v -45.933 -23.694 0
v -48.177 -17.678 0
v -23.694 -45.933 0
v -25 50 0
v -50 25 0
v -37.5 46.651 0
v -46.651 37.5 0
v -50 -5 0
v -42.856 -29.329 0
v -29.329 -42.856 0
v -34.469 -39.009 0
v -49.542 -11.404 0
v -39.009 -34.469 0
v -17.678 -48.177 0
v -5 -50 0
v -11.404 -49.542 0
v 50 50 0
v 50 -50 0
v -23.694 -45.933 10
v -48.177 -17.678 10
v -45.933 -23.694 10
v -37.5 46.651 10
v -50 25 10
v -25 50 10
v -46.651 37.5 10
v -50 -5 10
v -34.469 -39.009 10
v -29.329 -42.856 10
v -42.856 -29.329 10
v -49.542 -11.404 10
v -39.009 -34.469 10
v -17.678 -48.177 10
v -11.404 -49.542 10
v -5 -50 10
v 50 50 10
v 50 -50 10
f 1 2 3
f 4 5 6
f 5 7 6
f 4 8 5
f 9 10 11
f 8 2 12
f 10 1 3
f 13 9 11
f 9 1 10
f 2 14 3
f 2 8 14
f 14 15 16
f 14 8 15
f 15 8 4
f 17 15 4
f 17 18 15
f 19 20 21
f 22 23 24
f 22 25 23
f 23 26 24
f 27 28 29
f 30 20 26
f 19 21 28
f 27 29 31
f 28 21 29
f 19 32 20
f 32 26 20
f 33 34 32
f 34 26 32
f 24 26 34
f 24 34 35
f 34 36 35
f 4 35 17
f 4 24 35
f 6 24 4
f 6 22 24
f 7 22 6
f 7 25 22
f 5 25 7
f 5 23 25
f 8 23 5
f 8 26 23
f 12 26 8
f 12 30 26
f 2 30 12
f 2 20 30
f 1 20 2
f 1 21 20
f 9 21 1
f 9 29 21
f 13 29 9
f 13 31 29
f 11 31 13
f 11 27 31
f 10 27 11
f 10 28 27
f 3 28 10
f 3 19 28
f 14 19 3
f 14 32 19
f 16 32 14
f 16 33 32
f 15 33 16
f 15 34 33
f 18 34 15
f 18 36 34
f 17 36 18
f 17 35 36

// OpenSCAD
// file: ../lib/TOGArrayLib1.scad
// TOGArrayLib1.4
// 
// Functions for working with arrays.
// 
// v1.1:
// - tal1_reduce assert(is_list(items)) to prevent infinite recursion
//   when given undefined or other non-list values
// v1.1.1:
// - Fix tal1_uniq_remap_v2 to return "list-remap-result" as the
//   first element of the returned list
// v1.2:
// - Add tal1_replace_at function
// v1.3:
// - tal1_is_vec_of, tal1_is_vec_of_num
// v1.4:
// - tal1_assert_for_each, for when you want to assert something
//   about each of a list of items and get nice failure messages

/**
 * Make a list with the contents of list `a`,
 * but starting at offset `off`, replaced by the contents of list `b`.
 * len(result) = max(len(a), off+len(b))
 */
function tal1_replace_at(a, off, b, default_value=undef, default_value_function=undef) =
	assert(is_list(a))
	assert(is_list(b))
	let( _dvf = !is_undef(default_value_function) ? default_value_function : function(i) default_value )
[
	for( i=[0:1:min(off,len(a))-1] ) a[i],
	for( i=[len(a):1:off-1] ) _dvf(i),
	for( i=[off:1:off+len(b)-1] ) b[i-off],
	for( i=[off+len(b):1:len(a)-1] ) a[i],
];

// Simplest case
assert([] == tal1_replace_at([], 0, []));
// Second simplest cases
assert(["foo"] == tal1_replace_at(["foo"], 0, []));
assert(["foo"] == tal1_replace_at([], 0, ["foo"]));
// Replace one item
assert(["foo","quux","baz"] == tal1_replace_at(["foo","bar","baz"], 1, ["quux"]));
// Replace and extend
assert(["foo","quux","tuna","tina"] == tal1_replace_at(["foo","bar","baz"], 1, ["quux", "tuna", "tina"]));
// Add beyond end of `a`
assert(["foo","zzz","quux"] == tal1_replace_at(["foo"], 2, ["quux"], default_value="zzz"));
// Adding 'nothing' should still fill to that point with defaults
assert(["foo","zzz","zzz"] == tal1_replace_at(["foo"], 3, [], default_value="zzz"));


function tal1_reduce(start, items, func, offset=0) =
	assert(is_list(items))
	len(items) == offset ? start :
	tal1_reduce(func(start, items[offset]), items, func, offset+1);

function tal1_consecutive_duplicate_count(items) = tal1_reduce(
	[0, undef],
	items,
	function(z,item) [z[0] + (item == z[1] ? 1 : 0), item]
)[0];

assert(0 == tal1_consecutive_duplicate_count([]));
assert(0 == tal1_consecutive_duplicate_count([50]));
assert(1 == tal1_consecutive_duplicate_count([50,50]));
assert(0 == tal1_consecutive_duplicate_count([50,51,52,53]));
assert(1 == tal1_consecutive_duplicate_count([50,51,52,52]));
assert(3 == tal1_consecutive_duplicate_count([50,50,50,50]));

// Set test_size to arbirarily large values
// to ensure that OpenSCAD can handle heavy recursion
let(test_size=1000) assert(test_size/2 == tal1_consecutive_duplicate_count([for(i=[0:1:test_size-1]) floor(i/2)]));



function tal1_uniq_(items, off0, off1) =
	let(chunklen = off1-off0)
	chunklen == 0 ? [] :
	chunklen == 1 ? [items[off0]] :
	let(half=floor(chunklen/2))
	let(left  = tal1_uniq_(items, off0     , off0+half))
	let(right = tal1_uniq_(items, off0+half, off1     ))
	assert(len(left) > 0)
	assert(len(right) > 0)
	left[len(left)-1] == right[0] ? [each left, for(i=[1:1:len(right)-1]) right[i]] :
	[each left, each right];

/** Given a list of items, returns a new list with identical consecutive items merged */
function tal1_uniq(items) = tal1_uniq_(items, 0, len(items));

assert([] == tal1_uniq([]));
assert([123] == tal1_uniq([123]));
assert([55,0,1,2,3] == tal1_uniq([55,0,1,2,3]));
assert([55,0,1,2] == tal1_uniq([55,0,1,1,2]));
assert([55,0,1] == tal1_uniq([55,55,0,0,0,0,0,0,1,1,1,1]));
assert([55,0] == tal1_uniq([55,0,0,0,0,0,0,0]));



/**
 * Returns [new items, old index -> new index mapping].
 * No-op version.
 */
function tal1_uniq_remap_v1(items) =
	["list-remap-result", items, [for (vi=[0:1:len(items)-1]) vi]];

// [a, a, b, b, c, c]
//
// [a,    ...], []  -> [a],[0]
// [a, a, ...], [0] -> [a],[0,0]

assert([1,2,3] == [1,2,3]);

/**
 * Recursive version that will combine adjacent identical vertexes,
 * but will use the original items.
 */
function tal1_uniq_remap_v2(items, map=[]) =
	let(index = len(map))
	len(items) == index ? ["list-remap-result", items, map] :
	index == 0 ? tal1_uniq_remap_v2(items, [0]) :
	items[index] == items[map[index-1]] ? tal1_uniq_remap_v2(items, [for(vi=map) vi, map[index-1]]) :
	tal1_uniq_remap_v2(items, [for(vi=map) vi, index]);

assert(tal1_uniq_remap_v2([1,1,2,2,3,4]) == ["list-remap-result", [1,1,2,2,3,4], [0,0,2,2,4,5]]);


/**
 * Returns true if `vec` is a list of at least min_len items
 * and component_check(each item, even those beyond min_len) is true.
 */
function tal1_is_vec_of(vec, min_len=0, component_check=function(x) true) =
	assert(is_num(min_len) && min_len >= 0)
	assert(is_function(component_check))
	is_list(vec) && len(vec) >= min_len &&
	tal1_reduce(true, vec, function(prev,item) prev && component_check(item));

function tal1_is_vec_of_num(vec, min_len=0) = tal1_is_vec_of(vec, min_len, function(i) is_num(i));

assert( true == tal1_is_vec_of_num([1,2,3]));
assert( true == tal1_is_vec_of_num([]));
assert( true == tal1_is_vec_of_num([1,2,3], 3));
assert(false == tal1_is_vec_of_num([1,2], 3));
assert(false == tal1_is_vec_of_num([1,2,"spoon"], 3));
// Requirements are ambiguous when
// first min_len items are numbers, but there are non-numeric items afterwards,
// so let's error on the side of saying 'no, it's not a list of numbers';
// i.e. the item check and the min_len are independent.
assert(false == tal1_is_vec_of_num([1,2,3,"artichoke"], 3));


/**
 * Asserts that item_checker(each item in list, index of item)[0] is true.
 * Second element of item_checker return value is assertion message.
 * Returns the original list, in case that's useful to you.
 */
function tal1_assert_for_each(list, item_checker) =
	let( _ignored = [ for(i=[0:1:len(list)-1])
		let(q=item_checker(list[i],i))
		let(passed=is_bool(q) ? q : is_list(q) ? q[0] : assert(false, str(
			"tal1_assert_for_each: item_checker should return Bool|[Bool,String], but returned ",
			q, " for item at index ", i)))
		let(message=is_list(q) ? q[1] : undef)
		assert(passed, message)
		q
	])
	list;

// Callback can return a boolean...
assert([1,2,3] == tal1_assert_for_each([1,2,3], function(v,i) is_num(v)));
// ...or a [boolean, string]
assert([1,2,3] == tal1_assert_for_each([1,2,3], function(v,i) [is_num(v), "element be a num"]));
// file: ../lib/TOGComplexLib1.scad
function tcplx1_multiply(a, b) =
	[a[0]*b[0] - a[1]*b[1], a[0]*b[1] + a[1]*b[0]];
function tcplx1_divide(a, b) =
	let(bot = (b[0]*b[0] + b[1]*b[1]))
	[
		(a[0]*b[0] + a[1]*b[1])/bot,
		(a[1]*b[0] - a[0]*b[1])/bot
	];

assert([-11,23] == tcplx1_multiply([3,2], [1,7]));

assert([-1,3] == tcplx1_multiply([3,1], [0,1]));
assert([-1,3] == tcplx1_multiply([0,1], [3,1]));

echo(tcplx1_divide([-1,3], [3,1]));
assert([0,1] == tcplx1_divide([-1,3], [3,1]));

function tcplx1_normalize(vec) =
	let(veclen = sqrt(vec[0]*vec[0]+vec[1]*vec[1]))
	[vec[0] / veclen, vec[1] / veclen];

function tcplx1_relative_turnvec_vv(v0, v1) =
	tcplx1_divide(tcplx1_normalize(v1), tcplx1_normalize(v0));

function tcplx1_relative_turnvec_abc(p0, p1, p2) = tcplx1_relative_turnvec_vv(p1-p0, p2-p1);

// A 90-degree turn
assert([0,1] == tcplx1_relative_turnvec_abc([0,0], [1,0], [1,1]));
assert([0,1] == tcplx1_relative_turnvec_abc([0,0], [0,1], [-1,1]));

// A 45-degree turn
assert(tcplx1_normalize([1,1]) == tcplx1_relative_turnvec_abc([0,0], [1,0], [ 2,1]));
assert(tcplx1_normalize([1,1]) == tcplx1_relative_turnvec_abc([0,0], [0,1], [-1,2]));


function tcplx1_relative_angle_abc(p0, p1, p2) =
	let(turnvec = tcplx1_relative_turnvec_abc(p0, p1, p2))
	atan2(turnvec[1], turnvec[0]);

assert(-135 == tcplx1_relative_angle_abc([0,0], [1,0], [0,-1]));
assert( -90 == tcplx1_relative_angle_abc([0,0], [1,0], [1,-1]));
assert(   0 == tcplx1_relative_angle_abc([0,0], [1,0], [2, 0]));
assert(  90 == tcplx1_relative_angle_abc([0,0], [1,0], [1, 1]));
assert( 135 == tcplx1_relative_angle_abc([0,0], [1,0], [0, 1]));

assert(  90 == tcplx1_relative_angle_abc([1,1], [3,3], [1, 5]));
// file: ../lib/TOGMod1Constructors.scad
// TOGMod1Constructors-v1.6
// 
// Functions to construct objects understood by TOGMod1
// 
// v1.1:
// - Add togmod1_make_rounded_rect
// v1.2:
// - togmod1_make_rounded_rect can make ovals
// v1.3:
// - togmod1_circle_points, to just get the points of a circle
// - if pos parameter to circle function has a third element,
//   returned vertexes will include it as the z component;
// v1.3.1
// - Some assertions
// v1.4:
// - Refactor togmod1_rounded_rect_points and togmod1_circle_points
//   to use togmod1__make_nd_vector_adder for adapting to whatever
//   `pos` parameter is.
// v1.5:
// - togmod_rounded_rect_points will not simplify completely rounded sides
//   (where length of side is exactly twice the rounding radius)
//   unless simplify_rounded_sides=true
//   - This makes it more useful for polyhedron generation,
//     where radius varies, but number of points must remain constant.
// v1.6:
// - togmod1_make_rect makes a simple rectangle
// - togmod1_make_rounded_rect will defer to togmod1_make_rect when r=0

use <./TOGArrayLib1.scad>

function togmod1__make_nd_vector_adder(origin=[0,0]) =
	let(origin_is_zero = tal1_reduce(true, origin, function(prev,item) prev && item == 0))
	origin_is_zero ? (function(vec) len(vec) >= len(origin) ? vec : tal1_replace_at(origin, 0, vec)) :
	function(vec) [
		for(i=[0:1:max(len(origin),len(vec))-1]) (len(vec) > i ? vec[i] : 0) + (len(origin) > i ? origin[i] : 0),
	];

assert([1,2,3] == togmod1__make_nd_vector_adder()([1,2,3]));
echo(togmod1__make_nd_vector_adder([0,0,3])([1,2]));
assert([1,2,3] == togmod1__make_nd_vector_adder([0,0,3])([1,2]));


function togmod1_make_cuboid(size) =
	assert(is_list(size))
	assert(len(size) >= 3)
	assert(is_num(size[0]))
	assert(is_num(size[1]))
	assert(is_num(size[2]))
	["polyhedron-vf", [
		[-size[0]/2, -size[1]/2, -size[2]/2],
		[+size[0]/2, -size[1]/2, -size[2]/2],
		[-size[0]/2, +size[1]/2, -size[2]/2],
		[+size[0]/2, +size[1]/2, -size[2]/2],
		[-size[0]/2, -size[1]/2, +size[2]/2],
		[+size[0]/2, -size[1]/2, +size[2]/2],
		[-size[0]/2, +size[1]/2, +size[2]/2],
		[+size[0]/2, +size[1]/2, +size[2]/2]
	], [
		[0,1,3,2],[0,4,5,1],[4,6,7,5],[3,7,6,2],[1,5,7,3],[6,4,0,2]
	]];

function togmod1_make_polygon(verts) =
	["polygon-vp", verts, [[for( i=[0:1:len(verts)-1] ) i%len(verts)]]];

function togmod1_rounded_rect_points(size, r, pos=[0,0], simplify_rounded_sides=false) =
	assert(is_list(size))
	assert(len(size) >= 2)
	let(radii = is_list(r) ? r : is_num(r) ? [r,r] : assert(false, "rounded_rect r(adius) should be list<num> or num"))
	let(rx = radii[0])
	let(ry = radii[1])
	assert(is_num(rx))
	assert(is_num(ry))
	assert(size[0] >= 2*rx, str("size[0] must be >= 2*r[0]; size[0] = ",size[0],", 2*r[0] = ",2*rx))
	assert(size[1] >= 2*ry, str("size[1] must be >= 2*r[1]; size[1] = ",size[1],", 2*r[1] = ",2*ry))
	let(quarterfn=max($fn/4, 1))
	let(qfnx = simplify_rounded_sides && size[0] == 2*rx ? quarterfn-1 : quarterfn)
	let(qfny = simplify_rounded_sides && size[1] == 2*ry ? quarterfn-1 : quarterfn)
	let(finalizepos = togmod1__make_nd_vector_adder(pos))
[
	for(a=[0 : 1 : qfnx]) let(ang=      a*90/quarterfn) finalizepos([ size[0]/2-rx + rx*cos(ang),  size[1]/2-ry + ry*sin(ang)]),
	for(a=[0 : 1 : qfny]) let(ang= 90 + a*90/quarterfn) finalizepos([-size[0]/2+rx + rx*cos(ang),  size[1]/2-ry + ry*sin(ang)]),
	for(a=[0 : 1 : qfnx]) let(ang=180 + a*90/quarterfn) finalizepos([-size[0]/2+rx + rx*cos(ang), -size[1]/2+ry + ry*sin(ang)]),
	for(a=[0 : 1 : qfny]) let(ang=270 + a*90/quarterfn) finalizepos([ size[0]/2-rx + rx*cos(ang), -size[1]/2+ry + ry*sin(ang)]),
];

function togmod1_make_rect(size) =
	togmod1_make_polygon([
		[-size[0]/2, -size[1]/2],
		[+size[0]/2, -size[1]/2],
		[+size[0]/2, +size[1]/2],
		[-size[0]/2, +size[1]/2],
	]);

function togmod1_make_rounded_rect(size, r) =
	r == 0 ? togmod1_make_rect(size) :
	togmod1_make_polygon(togmod1_rounded_rect_points(size,r,simplify_rounded_sides=true));

function togmod1_circle_points(r, pos=[0,0], d=undef) =
	assert( !is_undef(r) || !is_undef(d) )
	assert(!is_undef(pos[0]))
	assert(!is_undef(pos[1]))
	let(finalizepos = togmod1__make_nd_vector_adder(pos))
	let(r_ = !is_undef(r) ? r : d/2)
	let(fn = max($fn, 6))
	[for(i=[0 : 1 : fn-1]) finalizepos([r_*cos(i*360/fn), r_*sin(i*360/fn)])];

function togmod1_make_circle(r, pos=[0,0], d=undef) =
	togmod1_make_polygon(togmod1_circle_points(r=r, pos=pos, d=d));

function togmod1_make_cylinder(d, zrange=[0,1], r=undef, pos=[0,0]) =
	assert( !is_undef(r) || !is_undef(d) )
	let( r_ = !is_undef(r) ? r : d/2 )
	// TODO: Make polyhedron directly
	["linear-extrude-zs", zrange, togmod1_make_circle(r=r_, pos=pos)];

function togmod1__is_range1d(range) = is_list(range) && len(range) == 2 && is_num(range[0]) && is_num(range[1]);

function togmod1_linear_extrude_z(range, shape) =
	assert(togmod1__is_range1d(range))
	["linear-extrude-zs", range, shape];
function togmod1_linear_extrude_x(range, shape) =
	assert(togmod1__is_range1d(range))
	["rotate", [90, 0, 90], togmod1_linear_extrude_z(range, shape)];
function togmod1_linear_extrude_y(range, shape) =
	assert(togmod1__is_range1d(range))
	["rotate", [90, 0, 180], togmod1_linear_extrude_z(range, shape)];
// file: ../lib/TOGMod1.scad
// TOGMod1
// OpenSCAD library for representing shapes
// 
// See also: Functional OpenSCAD (https://github.com/thehans/FunctionalOpenSCAD)

module togmod1_domodule(mod) {
	assert(is_list(mod));
	assert(len(mod) > 0);
	if( mod[0] == "polygon-vp" ) {
		// ["polygon-vp", vertexes, paths]
		polygon(points=mod[1], paths=mod[2]);
	} else if( mod[0] == "polyhedron-vf" ) {
		polyhedron(mod[1], faces=mod[2]);
	} else if( mod[0] == "scale" ) {
		assert(len(mod) == 3);
		scale(mod[1]) togmod1_domodule(mod[2]);
	} else if( mod[0] == "translate" ) {
		assert(len(mod) == 3);
		assert(is_list(mod[1]));
		for(c=mod[1]) assert(is_num(c), "translate component should be numeric");
		translate(mod[1]) togmod1_domodule(mod[2]);
	} else if( mod[0] == "rotate" ) {
		assert(len(mod) == 3);
		rotate(mod[1]) togmod1_domodule(mod[2]);
	} else if( mod[0] == "intersection" ) {
		intersection_for( i=[1:1:len(mod)-1] ) togmod1_domodule(mod[i]);
	} else if( mod[0] == "difference" ) {
		difference() {
			togmod1_domodule(mod[1]);
			for( i=[2:1:len(mod)-1] ) togmod1_domodule(mod[i]);
		}
	} else if( mod[0] == "union" ) {
		for( i=[1:1:len(mod)-1] ) togmod1_domodule(mod[i]);
	} else if( mod[0] == "hull" ) {
		hull() for( i=[1:1:len(mod)-1] ) togmod1_domodule(mod[i]);
	} else if( mod[0] == "offset-rs" ) {
		assert(len(mod) == 3);
		assert(is_num(mod[1]));
		assert(is_list(mod[2]));
		offset(mod[1]) togmod1_domodule(mod[2]);
	} else if( mod[0] == "linear-extrude-zs" ) {
		// ["linear-extrude-zs", [z0,z1], 2d_shape] // centered
		// ["linear-extrude-zs", height, 2d_shape]
		let( zrange = is_list(mod[1]) ? mod[1] : [-mod[1]/2, mod[1]/2] ) {
			translate([0,0,zrange[0]]) linear_extrude(zrange[1]-zrange[0]) togmod1_domodule(mod[2]);
		}
	} else if( mod[0] == "render" ) {
		render() togmod1_domodule(mod[1]);
	} else if( mod[0] == "minkowski" ) {
		minkowski() {
			togmod1_domodule(mod[1]);
			togmod1_domodule(mod[2]);
		}
	} else if( mod[0] == "x-debug" ) {
		# togmod1_domodule(mod[1]);
	} else {
		assert(false, str("Unrecognized shape: ", mod[0]));
	}
}
// main file
use <../lib/TOGPath1.scad>

assert(len(togpath1__round([1,0], [1,1], [0,1], 1, 1)) == 1);
assert(len(togpath1__round([1,0], [1,1], [0,1], 1, 2)) == 2);
assert(len(togpath1__round([1,0], [1,1], [0,1], 1, 3)) == 3);

// echo(togpath1__round([1,0], [1,1], [0,1], 1, 2));
assert(togpath1__round([1,0], [1,1], [0,1], 1, 2) == [[1,0], [0,1]]);

echo(togpath1__round([1,0], [1,1], [0,1], 1, 1));
assert(togpath1__round([1,0], [1,1], [0,1], 1, 1) == [[1,1]]);



use <../lib/TOGMod1.scad>
use <../lib/TOGMod1Constructors.scad>

some_rath = ["togpath1-rath",
	["togpath1-rathnode", [ 50,-50]],
	["togpath1-rathnode", [ 50, 50], ["round", 25,  1]],
	["togpath1-rathnode", [-50, 50], ["round", 25,  4]],
	["togpath1-rathnode", [-50,-50], ["round", 45, 12]],
];

some_rath_polypoints = togpath1_rath_to_polypoints(some_rath);
assert( 12+4+1+1 == len(some_rath_polypoints), str("len(rath polypoints) should be = to the sum of the force_fns"));

togmod1_domodule(["linear-extrude-zs", [0, 10], togmod1_make_polygon(some_rath_polypoints)]);
